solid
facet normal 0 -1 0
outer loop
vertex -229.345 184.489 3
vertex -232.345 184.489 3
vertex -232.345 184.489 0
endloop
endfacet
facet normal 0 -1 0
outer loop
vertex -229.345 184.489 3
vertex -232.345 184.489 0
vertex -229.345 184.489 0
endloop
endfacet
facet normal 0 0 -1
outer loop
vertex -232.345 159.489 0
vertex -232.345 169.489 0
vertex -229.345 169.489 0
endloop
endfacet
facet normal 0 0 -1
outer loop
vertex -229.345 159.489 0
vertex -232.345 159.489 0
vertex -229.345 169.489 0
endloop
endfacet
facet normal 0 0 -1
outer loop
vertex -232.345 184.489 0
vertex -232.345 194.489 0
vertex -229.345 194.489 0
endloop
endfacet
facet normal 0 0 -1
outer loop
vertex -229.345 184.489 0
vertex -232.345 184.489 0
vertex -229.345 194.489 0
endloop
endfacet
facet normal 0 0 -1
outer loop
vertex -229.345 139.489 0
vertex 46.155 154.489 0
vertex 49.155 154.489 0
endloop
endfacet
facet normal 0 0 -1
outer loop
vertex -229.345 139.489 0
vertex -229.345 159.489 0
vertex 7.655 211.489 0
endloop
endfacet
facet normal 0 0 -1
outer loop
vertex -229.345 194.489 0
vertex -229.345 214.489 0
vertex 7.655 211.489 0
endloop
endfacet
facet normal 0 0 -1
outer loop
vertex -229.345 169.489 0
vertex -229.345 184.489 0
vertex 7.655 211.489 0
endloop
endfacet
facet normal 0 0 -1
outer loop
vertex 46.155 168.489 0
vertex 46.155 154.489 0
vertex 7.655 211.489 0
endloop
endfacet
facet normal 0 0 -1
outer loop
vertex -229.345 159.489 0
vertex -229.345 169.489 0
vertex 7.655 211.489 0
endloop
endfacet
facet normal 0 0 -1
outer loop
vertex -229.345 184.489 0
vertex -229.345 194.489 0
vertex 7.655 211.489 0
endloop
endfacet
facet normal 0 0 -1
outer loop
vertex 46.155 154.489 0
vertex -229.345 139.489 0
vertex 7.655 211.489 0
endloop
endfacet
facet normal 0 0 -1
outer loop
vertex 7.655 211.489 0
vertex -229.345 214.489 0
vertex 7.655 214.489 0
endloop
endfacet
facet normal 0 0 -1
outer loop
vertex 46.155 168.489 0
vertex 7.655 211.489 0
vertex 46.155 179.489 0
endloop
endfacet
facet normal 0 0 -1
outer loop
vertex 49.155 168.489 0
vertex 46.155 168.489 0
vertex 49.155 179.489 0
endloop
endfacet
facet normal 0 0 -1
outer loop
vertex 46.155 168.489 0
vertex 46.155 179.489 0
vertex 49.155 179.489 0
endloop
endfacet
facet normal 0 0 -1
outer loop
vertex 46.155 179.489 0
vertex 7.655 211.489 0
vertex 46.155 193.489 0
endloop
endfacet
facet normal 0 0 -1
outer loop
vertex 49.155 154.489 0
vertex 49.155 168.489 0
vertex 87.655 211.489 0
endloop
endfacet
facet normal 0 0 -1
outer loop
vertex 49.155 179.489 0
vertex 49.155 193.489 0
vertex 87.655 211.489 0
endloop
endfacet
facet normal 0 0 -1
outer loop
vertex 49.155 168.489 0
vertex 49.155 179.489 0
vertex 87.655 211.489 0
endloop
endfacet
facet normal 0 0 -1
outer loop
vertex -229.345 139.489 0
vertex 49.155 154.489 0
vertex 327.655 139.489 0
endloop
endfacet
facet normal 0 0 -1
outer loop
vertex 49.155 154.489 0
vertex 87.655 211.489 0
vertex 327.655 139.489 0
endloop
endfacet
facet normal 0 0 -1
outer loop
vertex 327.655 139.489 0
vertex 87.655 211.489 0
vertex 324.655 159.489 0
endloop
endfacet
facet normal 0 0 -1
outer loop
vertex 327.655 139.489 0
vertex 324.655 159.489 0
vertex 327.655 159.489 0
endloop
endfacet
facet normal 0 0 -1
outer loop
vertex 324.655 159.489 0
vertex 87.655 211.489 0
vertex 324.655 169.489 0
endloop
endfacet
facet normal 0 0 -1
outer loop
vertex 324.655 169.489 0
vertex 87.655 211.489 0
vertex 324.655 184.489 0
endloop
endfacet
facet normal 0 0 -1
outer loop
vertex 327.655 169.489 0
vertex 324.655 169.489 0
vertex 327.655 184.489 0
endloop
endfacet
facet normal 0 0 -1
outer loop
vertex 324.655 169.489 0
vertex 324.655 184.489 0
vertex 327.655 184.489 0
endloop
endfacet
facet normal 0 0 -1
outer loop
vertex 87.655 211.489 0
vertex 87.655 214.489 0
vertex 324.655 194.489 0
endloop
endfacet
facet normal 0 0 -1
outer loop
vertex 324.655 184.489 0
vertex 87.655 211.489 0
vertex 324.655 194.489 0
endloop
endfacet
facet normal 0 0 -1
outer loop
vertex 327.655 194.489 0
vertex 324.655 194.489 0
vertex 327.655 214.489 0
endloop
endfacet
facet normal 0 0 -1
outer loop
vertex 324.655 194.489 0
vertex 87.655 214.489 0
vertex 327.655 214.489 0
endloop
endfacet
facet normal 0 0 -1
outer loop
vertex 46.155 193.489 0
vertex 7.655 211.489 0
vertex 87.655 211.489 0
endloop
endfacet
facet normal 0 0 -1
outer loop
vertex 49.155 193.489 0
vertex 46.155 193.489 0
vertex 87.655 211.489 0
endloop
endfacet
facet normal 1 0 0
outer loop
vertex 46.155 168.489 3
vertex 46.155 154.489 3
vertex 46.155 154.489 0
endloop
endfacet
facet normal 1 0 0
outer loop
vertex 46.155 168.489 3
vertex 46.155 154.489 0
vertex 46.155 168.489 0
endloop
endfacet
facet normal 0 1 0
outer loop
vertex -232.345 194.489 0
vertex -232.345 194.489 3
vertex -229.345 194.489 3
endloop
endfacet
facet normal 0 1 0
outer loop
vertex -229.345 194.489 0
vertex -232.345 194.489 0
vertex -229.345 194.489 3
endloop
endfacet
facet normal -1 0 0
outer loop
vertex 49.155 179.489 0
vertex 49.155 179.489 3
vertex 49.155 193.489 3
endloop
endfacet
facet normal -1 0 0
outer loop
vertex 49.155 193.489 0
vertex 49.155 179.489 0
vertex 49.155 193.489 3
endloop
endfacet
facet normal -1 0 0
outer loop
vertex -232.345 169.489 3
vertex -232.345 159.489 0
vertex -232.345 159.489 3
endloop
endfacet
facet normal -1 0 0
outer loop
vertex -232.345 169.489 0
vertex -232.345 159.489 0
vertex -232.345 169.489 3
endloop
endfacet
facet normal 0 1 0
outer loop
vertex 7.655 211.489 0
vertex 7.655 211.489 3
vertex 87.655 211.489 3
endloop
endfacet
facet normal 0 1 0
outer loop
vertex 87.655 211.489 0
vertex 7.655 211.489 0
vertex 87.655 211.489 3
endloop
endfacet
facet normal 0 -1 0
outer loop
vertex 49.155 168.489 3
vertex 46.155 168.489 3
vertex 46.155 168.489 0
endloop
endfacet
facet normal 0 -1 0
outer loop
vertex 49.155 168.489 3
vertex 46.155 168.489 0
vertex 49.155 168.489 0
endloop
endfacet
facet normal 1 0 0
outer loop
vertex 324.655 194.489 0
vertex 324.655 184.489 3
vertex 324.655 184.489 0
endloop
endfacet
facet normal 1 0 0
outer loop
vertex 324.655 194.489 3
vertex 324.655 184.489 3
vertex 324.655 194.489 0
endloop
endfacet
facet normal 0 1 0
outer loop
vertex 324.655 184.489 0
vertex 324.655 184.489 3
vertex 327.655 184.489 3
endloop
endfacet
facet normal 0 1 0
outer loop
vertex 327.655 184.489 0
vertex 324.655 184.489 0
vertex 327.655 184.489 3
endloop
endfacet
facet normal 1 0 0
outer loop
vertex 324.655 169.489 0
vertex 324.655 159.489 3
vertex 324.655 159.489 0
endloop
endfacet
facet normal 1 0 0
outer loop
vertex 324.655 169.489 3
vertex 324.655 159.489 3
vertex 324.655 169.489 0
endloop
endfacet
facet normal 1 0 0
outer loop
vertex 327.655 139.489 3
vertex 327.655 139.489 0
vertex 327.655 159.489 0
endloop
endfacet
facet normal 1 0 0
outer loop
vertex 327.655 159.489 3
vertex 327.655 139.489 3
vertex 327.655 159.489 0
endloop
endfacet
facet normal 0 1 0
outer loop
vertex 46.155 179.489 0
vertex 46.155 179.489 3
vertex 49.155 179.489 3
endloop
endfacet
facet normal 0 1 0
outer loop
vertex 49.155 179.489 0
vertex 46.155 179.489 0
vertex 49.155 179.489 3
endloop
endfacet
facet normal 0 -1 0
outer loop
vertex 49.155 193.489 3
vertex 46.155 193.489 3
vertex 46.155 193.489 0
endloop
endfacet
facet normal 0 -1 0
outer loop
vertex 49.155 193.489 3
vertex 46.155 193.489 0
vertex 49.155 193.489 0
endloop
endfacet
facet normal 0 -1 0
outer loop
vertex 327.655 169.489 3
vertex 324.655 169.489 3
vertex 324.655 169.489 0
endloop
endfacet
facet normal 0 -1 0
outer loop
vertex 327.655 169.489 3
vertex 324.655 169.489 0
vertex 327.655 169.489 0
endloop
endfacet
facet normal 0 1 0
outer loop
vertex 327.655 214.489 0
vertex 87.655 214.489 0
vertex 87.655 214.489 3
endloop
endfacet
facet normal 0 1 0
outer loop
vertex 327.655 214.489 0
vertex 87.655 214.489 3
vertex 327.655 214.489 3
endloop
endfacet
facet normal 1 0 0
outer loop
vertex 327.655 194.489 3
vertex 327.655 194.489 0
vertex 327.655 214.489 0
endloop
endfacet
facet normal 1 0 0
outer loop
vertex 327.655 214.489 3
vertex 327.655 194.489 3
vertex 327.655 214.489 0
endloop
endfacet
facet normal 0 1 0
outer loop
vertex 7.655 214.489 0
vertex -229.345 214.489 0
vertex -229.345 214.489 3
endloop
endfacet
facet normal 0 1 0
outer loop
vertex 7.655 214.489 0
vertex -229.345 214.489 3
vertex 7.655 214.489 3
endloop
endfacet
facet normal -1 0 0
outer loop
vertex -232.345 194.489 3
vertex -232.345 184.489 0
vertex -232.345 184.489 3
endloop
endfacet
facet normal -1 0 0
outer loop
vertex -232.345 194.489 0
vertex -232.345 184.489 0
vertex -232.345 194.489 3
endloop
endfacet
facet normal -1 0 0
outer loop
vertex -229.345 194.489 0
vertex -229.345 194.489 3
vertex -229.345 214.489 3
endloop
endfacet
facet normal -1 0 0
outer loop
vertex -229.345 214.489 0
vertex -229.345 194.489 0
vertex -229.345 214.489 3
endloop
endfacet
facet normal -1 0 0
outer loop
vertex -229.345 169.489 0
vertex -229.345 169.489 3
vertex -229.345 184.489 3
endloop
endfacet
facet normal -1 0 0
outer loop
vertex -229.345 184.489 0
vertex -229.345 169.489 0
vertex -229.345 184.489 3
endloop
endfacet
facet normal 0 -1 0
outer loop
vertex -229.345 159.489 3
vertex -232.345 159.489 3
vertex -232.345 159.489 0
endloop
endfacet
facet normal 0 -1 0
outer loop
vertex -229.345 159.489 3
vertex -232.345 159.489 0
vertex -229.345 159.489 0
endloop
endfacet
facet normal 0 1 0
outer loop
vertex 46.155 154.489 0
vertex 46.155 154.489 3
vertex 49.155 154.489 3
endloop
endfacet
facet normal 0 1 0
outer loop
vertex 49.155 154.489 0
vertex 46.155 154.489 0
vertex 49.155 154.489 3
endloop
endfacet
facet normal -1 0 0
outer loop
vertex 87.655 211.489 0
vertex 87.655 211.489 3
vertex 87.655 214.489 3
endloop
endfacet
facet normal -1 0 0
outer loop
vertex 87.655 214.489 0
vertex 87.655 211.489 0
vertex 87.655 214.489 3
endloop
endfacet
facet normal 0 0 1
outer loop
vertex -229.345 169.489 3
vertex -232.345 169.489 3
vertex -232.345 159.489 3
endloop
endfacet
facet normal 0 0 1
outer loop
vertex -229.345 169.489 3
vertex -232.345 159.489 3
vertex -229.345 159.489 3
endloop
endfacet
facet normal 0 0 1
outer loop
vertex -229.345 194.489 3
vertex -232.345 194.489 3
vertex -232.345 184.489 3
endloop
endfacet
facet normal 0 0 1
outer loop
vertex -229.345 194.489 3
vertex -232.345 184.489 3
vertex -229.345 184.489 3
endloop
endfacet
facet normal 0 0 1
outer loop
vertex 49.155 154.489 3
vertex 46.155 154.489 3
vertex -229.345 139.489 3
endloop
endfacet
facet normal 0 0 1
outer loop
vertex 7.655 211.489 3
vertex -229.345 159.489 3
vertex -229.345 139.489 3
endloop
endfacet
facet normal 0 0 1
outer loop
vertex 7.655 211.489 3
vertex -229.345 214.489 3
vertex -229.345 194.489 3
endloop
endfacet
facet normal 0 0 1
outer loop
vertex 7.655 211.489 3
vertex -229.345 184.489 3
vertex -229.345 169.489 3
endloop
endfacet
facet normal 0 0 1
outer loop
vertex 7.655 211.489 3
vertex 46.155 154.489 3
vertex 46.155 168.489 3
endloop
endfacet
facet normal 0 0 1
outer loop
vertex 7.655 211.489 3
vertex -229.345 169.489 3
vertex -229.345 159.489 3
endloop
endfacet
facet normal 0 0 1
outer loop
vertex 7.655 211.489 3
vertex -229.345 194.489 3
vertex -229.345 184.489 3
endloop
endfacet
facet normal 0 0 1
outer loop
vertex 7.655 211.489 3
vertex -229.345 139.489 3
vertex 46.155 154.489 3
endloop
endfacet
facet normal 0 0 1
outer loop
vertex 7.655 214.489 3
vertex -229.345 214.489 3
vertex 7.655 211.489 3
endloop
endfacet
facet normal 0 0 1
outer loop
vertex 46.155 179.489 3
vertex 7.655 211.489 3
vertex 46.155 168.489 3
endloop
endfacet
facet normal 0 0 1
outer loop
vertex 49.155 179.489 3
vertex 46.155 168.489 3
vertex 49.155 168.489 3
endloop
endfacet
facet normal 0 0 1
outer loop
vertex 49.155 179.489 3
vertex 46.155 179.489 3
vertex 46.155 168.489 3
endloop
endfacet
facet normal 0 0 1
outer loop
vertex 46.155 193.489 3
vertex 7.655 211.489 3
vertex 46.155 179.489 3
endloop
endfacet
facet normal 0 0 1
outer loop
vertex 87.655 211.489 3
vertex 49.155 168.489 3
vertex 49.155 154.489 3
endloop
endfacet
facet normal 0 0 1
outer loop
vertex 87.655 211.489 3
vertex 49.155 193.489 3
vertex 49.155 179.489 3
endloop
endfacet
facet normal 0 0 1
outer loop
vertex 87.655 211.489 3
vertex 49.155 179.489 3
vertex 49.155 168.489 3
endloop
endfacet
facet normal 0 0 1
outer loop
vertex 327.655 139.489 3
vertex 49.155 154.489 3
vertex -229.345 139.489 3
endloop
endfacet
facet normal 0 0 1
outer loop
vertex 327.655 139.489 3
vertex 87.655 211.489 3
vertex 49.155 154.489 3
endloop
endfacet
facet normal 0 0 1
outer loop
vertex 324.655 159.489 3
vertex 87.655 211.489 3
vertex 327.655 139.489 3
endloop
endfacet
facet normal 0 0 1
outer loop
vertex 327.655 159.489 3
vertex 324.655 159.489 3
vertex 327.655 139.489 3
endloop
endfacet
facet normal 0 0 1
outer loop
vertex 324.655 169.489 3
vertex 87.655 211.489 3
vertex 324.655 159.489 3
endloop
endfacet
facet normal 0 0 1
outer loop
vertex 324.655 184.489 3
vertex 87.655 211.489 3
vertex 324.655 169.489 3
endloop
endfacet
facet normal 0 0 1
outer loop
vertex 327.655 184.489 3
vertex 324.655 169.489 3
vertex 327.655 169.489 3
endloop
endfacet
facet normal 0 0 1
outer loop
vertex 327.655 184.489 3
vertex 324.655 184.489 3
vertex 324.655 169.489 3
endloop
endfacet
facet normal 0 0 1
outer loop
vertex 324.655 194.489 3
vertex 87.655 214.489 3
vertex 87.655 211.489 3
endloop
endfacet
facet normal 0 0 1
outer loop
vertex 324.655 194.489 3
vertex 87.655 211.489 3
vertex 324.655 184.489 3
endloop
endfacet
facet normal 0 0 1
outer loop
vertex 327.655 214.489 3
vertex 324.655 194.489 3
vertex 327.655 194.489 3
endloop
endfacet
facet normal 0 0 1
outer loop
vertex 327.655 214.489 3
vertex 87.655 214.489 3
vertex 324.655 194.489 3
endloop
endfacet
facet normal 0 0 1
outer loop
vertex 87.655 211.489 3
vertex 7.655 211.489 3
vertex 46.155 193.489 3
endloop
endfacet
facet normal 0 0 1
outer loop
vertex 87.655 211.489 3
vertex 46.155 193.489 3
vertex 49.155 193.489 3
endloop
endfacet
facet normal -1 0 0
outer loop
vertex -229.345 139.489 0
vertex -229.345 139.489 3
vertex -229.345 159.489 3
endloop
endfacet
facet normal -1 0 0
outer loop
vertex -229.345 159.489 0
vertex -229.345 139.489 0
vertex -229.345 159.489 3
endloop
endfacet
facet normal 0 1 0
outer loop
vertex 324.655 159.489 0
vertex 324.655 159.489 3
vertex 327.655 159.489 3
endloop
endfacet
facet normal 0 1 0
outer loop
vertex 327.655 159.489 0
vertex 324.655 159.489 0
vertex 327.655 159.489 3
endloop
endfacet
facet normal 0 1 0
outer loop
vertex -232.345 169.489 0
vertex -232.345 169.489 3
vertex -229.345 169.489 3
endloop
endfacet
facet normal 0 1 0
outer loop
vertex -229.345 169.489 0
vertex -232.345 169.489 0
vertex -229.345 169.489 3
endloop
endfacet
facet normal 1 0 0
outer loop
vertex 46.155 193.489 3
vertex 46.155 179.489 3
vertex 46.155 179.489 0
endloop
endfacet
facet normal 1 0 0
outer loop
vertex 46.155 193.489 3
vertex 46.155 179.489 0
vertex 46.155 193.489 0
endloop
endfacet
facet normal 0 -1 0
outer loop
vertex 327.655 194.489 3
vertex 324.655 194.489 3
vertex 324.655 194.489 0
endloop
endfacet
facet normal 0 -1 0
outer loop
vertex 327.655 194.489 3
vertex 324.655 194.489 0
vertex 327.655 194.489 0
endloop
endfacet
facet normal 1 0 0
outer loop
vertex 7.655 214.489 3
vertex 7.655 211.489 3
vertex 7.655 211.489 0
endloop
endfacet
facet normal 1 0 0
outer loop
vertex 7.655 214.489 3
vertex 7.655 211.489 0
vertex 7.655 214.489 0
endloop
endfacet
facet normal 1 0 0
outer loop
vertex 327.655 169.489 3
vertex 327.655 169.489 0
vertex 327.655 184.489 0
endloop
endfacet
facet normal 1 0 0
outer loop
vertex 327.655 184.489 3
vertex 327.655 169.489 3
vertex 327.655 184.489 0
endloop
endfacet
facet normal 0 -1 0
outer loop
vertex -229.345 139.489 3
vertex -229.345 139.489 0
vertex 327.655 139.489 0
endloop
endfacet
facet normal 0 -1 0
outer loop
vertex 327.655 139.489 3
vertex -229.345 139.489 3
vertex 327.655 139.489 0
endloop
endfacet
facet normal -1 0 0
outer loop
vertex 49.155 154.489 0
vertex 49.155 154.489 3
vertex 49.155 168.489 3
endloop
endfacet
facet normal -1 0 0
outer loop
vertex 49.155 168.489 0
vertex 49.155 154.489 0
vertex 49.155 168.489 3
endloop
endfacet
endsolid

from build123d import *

# Parameters (mm, degrees)
SKETCH1_W           = 560
SKETCH1_H           = 75
BOSS_EXTRUDE1_DEPTH = 3
SKETCH2_W           = 3
SKETCH2_H           = 10
CUT_EXTRUDE1_DEPTH  = 3
SKETCH3_W           = 3
SKETCH3_H           = 20
SKETCH3_H_2         = 15
CUT_EXTRUDE2_DEPTH  = 3
SKETCH4_W           = 80
SKETCH4_H           = 3
CUT_EXTRUDE3_DEPTH  = 3
SKETCH5_W           = 3
SKETCH5_H           = 14
CUT_EXTRUDE4_DEPTH  = 10


with BuildPart() as part:
    # Sketch1 → Boss-Extrude1 (new body)
    with BuildSketch(Plane.XY):
        with Locations((47.655062333, 176.988975695)):
            Rectangle(SKETCH1_W, SKETCH1_H)
    extrude(amount=BOSS_EXTRUDE1_DEPTH)

    # Sketch2 → Cut-Extrude1 (cut)
    with BuildSketch(Plane.XY.offset(3)):
        with Locations((326.155062333, 189.488975695)):
            Rectangle(SKETCH2_W, SKETCH2_H)
        with Locations((326.155062333, 164.488975695)):
            Rectangle(SKETCH2_W, SKETCH2_H)
    extrude(amount=-CUT_EXTRUDE1_DEPTH, mode=Mode.SUBTRACT)

    # Sketch3 → Cut-Extrude2 (cut)
    with BuildSketch(Plane.XY.offset(3)):
        with Locations((-230.844937667, 204.488975695)):
            Rectangle(SKETCH3_W, SKETCH3_H)
        with Locations((-230.844937667, 149.488975695)):
            Rectangle(SKETCH3_W, SKETCH3_H)
        with Locations((-230.844937667, 176.988975695)):
            Rectangle(SKETCH3_W, SKETCH3_H_2)
    extrude(amount=-CUT_EXTRUDE2_DEPTH, mode=Mode.SUBTRACT)

    # Sketch4 → Cut-Extrude3 (cut)
    with BuildSketch(Plane.XY.offset(3)):
        with Locations((47.655062333, 212.988975695)):
            Rectangle(SKETCH4_W, SKETCH4_H)
    extrude(amount=-CUT_EXTRUDE3_DEPTH, mode=Mode.SUBTRACT)

    # Sketch5 → Cut-Extrude4 (cut)
    with BuildSketch(Plane.XY.offset(3)):
        with Locations((47.655062333, 186.488975695)):
            Rectangle(SKETCH5_W, SKETCH5_H)
        with Locations((47.655062333, 161.488975695)):
            Rectangle(SKETCH5_W, SKETCH5_H)
    extrude(amount=-CUT_EXTRUDE4_DEPTH, mode=Mode.SUBTRACT)


solid = part.part
